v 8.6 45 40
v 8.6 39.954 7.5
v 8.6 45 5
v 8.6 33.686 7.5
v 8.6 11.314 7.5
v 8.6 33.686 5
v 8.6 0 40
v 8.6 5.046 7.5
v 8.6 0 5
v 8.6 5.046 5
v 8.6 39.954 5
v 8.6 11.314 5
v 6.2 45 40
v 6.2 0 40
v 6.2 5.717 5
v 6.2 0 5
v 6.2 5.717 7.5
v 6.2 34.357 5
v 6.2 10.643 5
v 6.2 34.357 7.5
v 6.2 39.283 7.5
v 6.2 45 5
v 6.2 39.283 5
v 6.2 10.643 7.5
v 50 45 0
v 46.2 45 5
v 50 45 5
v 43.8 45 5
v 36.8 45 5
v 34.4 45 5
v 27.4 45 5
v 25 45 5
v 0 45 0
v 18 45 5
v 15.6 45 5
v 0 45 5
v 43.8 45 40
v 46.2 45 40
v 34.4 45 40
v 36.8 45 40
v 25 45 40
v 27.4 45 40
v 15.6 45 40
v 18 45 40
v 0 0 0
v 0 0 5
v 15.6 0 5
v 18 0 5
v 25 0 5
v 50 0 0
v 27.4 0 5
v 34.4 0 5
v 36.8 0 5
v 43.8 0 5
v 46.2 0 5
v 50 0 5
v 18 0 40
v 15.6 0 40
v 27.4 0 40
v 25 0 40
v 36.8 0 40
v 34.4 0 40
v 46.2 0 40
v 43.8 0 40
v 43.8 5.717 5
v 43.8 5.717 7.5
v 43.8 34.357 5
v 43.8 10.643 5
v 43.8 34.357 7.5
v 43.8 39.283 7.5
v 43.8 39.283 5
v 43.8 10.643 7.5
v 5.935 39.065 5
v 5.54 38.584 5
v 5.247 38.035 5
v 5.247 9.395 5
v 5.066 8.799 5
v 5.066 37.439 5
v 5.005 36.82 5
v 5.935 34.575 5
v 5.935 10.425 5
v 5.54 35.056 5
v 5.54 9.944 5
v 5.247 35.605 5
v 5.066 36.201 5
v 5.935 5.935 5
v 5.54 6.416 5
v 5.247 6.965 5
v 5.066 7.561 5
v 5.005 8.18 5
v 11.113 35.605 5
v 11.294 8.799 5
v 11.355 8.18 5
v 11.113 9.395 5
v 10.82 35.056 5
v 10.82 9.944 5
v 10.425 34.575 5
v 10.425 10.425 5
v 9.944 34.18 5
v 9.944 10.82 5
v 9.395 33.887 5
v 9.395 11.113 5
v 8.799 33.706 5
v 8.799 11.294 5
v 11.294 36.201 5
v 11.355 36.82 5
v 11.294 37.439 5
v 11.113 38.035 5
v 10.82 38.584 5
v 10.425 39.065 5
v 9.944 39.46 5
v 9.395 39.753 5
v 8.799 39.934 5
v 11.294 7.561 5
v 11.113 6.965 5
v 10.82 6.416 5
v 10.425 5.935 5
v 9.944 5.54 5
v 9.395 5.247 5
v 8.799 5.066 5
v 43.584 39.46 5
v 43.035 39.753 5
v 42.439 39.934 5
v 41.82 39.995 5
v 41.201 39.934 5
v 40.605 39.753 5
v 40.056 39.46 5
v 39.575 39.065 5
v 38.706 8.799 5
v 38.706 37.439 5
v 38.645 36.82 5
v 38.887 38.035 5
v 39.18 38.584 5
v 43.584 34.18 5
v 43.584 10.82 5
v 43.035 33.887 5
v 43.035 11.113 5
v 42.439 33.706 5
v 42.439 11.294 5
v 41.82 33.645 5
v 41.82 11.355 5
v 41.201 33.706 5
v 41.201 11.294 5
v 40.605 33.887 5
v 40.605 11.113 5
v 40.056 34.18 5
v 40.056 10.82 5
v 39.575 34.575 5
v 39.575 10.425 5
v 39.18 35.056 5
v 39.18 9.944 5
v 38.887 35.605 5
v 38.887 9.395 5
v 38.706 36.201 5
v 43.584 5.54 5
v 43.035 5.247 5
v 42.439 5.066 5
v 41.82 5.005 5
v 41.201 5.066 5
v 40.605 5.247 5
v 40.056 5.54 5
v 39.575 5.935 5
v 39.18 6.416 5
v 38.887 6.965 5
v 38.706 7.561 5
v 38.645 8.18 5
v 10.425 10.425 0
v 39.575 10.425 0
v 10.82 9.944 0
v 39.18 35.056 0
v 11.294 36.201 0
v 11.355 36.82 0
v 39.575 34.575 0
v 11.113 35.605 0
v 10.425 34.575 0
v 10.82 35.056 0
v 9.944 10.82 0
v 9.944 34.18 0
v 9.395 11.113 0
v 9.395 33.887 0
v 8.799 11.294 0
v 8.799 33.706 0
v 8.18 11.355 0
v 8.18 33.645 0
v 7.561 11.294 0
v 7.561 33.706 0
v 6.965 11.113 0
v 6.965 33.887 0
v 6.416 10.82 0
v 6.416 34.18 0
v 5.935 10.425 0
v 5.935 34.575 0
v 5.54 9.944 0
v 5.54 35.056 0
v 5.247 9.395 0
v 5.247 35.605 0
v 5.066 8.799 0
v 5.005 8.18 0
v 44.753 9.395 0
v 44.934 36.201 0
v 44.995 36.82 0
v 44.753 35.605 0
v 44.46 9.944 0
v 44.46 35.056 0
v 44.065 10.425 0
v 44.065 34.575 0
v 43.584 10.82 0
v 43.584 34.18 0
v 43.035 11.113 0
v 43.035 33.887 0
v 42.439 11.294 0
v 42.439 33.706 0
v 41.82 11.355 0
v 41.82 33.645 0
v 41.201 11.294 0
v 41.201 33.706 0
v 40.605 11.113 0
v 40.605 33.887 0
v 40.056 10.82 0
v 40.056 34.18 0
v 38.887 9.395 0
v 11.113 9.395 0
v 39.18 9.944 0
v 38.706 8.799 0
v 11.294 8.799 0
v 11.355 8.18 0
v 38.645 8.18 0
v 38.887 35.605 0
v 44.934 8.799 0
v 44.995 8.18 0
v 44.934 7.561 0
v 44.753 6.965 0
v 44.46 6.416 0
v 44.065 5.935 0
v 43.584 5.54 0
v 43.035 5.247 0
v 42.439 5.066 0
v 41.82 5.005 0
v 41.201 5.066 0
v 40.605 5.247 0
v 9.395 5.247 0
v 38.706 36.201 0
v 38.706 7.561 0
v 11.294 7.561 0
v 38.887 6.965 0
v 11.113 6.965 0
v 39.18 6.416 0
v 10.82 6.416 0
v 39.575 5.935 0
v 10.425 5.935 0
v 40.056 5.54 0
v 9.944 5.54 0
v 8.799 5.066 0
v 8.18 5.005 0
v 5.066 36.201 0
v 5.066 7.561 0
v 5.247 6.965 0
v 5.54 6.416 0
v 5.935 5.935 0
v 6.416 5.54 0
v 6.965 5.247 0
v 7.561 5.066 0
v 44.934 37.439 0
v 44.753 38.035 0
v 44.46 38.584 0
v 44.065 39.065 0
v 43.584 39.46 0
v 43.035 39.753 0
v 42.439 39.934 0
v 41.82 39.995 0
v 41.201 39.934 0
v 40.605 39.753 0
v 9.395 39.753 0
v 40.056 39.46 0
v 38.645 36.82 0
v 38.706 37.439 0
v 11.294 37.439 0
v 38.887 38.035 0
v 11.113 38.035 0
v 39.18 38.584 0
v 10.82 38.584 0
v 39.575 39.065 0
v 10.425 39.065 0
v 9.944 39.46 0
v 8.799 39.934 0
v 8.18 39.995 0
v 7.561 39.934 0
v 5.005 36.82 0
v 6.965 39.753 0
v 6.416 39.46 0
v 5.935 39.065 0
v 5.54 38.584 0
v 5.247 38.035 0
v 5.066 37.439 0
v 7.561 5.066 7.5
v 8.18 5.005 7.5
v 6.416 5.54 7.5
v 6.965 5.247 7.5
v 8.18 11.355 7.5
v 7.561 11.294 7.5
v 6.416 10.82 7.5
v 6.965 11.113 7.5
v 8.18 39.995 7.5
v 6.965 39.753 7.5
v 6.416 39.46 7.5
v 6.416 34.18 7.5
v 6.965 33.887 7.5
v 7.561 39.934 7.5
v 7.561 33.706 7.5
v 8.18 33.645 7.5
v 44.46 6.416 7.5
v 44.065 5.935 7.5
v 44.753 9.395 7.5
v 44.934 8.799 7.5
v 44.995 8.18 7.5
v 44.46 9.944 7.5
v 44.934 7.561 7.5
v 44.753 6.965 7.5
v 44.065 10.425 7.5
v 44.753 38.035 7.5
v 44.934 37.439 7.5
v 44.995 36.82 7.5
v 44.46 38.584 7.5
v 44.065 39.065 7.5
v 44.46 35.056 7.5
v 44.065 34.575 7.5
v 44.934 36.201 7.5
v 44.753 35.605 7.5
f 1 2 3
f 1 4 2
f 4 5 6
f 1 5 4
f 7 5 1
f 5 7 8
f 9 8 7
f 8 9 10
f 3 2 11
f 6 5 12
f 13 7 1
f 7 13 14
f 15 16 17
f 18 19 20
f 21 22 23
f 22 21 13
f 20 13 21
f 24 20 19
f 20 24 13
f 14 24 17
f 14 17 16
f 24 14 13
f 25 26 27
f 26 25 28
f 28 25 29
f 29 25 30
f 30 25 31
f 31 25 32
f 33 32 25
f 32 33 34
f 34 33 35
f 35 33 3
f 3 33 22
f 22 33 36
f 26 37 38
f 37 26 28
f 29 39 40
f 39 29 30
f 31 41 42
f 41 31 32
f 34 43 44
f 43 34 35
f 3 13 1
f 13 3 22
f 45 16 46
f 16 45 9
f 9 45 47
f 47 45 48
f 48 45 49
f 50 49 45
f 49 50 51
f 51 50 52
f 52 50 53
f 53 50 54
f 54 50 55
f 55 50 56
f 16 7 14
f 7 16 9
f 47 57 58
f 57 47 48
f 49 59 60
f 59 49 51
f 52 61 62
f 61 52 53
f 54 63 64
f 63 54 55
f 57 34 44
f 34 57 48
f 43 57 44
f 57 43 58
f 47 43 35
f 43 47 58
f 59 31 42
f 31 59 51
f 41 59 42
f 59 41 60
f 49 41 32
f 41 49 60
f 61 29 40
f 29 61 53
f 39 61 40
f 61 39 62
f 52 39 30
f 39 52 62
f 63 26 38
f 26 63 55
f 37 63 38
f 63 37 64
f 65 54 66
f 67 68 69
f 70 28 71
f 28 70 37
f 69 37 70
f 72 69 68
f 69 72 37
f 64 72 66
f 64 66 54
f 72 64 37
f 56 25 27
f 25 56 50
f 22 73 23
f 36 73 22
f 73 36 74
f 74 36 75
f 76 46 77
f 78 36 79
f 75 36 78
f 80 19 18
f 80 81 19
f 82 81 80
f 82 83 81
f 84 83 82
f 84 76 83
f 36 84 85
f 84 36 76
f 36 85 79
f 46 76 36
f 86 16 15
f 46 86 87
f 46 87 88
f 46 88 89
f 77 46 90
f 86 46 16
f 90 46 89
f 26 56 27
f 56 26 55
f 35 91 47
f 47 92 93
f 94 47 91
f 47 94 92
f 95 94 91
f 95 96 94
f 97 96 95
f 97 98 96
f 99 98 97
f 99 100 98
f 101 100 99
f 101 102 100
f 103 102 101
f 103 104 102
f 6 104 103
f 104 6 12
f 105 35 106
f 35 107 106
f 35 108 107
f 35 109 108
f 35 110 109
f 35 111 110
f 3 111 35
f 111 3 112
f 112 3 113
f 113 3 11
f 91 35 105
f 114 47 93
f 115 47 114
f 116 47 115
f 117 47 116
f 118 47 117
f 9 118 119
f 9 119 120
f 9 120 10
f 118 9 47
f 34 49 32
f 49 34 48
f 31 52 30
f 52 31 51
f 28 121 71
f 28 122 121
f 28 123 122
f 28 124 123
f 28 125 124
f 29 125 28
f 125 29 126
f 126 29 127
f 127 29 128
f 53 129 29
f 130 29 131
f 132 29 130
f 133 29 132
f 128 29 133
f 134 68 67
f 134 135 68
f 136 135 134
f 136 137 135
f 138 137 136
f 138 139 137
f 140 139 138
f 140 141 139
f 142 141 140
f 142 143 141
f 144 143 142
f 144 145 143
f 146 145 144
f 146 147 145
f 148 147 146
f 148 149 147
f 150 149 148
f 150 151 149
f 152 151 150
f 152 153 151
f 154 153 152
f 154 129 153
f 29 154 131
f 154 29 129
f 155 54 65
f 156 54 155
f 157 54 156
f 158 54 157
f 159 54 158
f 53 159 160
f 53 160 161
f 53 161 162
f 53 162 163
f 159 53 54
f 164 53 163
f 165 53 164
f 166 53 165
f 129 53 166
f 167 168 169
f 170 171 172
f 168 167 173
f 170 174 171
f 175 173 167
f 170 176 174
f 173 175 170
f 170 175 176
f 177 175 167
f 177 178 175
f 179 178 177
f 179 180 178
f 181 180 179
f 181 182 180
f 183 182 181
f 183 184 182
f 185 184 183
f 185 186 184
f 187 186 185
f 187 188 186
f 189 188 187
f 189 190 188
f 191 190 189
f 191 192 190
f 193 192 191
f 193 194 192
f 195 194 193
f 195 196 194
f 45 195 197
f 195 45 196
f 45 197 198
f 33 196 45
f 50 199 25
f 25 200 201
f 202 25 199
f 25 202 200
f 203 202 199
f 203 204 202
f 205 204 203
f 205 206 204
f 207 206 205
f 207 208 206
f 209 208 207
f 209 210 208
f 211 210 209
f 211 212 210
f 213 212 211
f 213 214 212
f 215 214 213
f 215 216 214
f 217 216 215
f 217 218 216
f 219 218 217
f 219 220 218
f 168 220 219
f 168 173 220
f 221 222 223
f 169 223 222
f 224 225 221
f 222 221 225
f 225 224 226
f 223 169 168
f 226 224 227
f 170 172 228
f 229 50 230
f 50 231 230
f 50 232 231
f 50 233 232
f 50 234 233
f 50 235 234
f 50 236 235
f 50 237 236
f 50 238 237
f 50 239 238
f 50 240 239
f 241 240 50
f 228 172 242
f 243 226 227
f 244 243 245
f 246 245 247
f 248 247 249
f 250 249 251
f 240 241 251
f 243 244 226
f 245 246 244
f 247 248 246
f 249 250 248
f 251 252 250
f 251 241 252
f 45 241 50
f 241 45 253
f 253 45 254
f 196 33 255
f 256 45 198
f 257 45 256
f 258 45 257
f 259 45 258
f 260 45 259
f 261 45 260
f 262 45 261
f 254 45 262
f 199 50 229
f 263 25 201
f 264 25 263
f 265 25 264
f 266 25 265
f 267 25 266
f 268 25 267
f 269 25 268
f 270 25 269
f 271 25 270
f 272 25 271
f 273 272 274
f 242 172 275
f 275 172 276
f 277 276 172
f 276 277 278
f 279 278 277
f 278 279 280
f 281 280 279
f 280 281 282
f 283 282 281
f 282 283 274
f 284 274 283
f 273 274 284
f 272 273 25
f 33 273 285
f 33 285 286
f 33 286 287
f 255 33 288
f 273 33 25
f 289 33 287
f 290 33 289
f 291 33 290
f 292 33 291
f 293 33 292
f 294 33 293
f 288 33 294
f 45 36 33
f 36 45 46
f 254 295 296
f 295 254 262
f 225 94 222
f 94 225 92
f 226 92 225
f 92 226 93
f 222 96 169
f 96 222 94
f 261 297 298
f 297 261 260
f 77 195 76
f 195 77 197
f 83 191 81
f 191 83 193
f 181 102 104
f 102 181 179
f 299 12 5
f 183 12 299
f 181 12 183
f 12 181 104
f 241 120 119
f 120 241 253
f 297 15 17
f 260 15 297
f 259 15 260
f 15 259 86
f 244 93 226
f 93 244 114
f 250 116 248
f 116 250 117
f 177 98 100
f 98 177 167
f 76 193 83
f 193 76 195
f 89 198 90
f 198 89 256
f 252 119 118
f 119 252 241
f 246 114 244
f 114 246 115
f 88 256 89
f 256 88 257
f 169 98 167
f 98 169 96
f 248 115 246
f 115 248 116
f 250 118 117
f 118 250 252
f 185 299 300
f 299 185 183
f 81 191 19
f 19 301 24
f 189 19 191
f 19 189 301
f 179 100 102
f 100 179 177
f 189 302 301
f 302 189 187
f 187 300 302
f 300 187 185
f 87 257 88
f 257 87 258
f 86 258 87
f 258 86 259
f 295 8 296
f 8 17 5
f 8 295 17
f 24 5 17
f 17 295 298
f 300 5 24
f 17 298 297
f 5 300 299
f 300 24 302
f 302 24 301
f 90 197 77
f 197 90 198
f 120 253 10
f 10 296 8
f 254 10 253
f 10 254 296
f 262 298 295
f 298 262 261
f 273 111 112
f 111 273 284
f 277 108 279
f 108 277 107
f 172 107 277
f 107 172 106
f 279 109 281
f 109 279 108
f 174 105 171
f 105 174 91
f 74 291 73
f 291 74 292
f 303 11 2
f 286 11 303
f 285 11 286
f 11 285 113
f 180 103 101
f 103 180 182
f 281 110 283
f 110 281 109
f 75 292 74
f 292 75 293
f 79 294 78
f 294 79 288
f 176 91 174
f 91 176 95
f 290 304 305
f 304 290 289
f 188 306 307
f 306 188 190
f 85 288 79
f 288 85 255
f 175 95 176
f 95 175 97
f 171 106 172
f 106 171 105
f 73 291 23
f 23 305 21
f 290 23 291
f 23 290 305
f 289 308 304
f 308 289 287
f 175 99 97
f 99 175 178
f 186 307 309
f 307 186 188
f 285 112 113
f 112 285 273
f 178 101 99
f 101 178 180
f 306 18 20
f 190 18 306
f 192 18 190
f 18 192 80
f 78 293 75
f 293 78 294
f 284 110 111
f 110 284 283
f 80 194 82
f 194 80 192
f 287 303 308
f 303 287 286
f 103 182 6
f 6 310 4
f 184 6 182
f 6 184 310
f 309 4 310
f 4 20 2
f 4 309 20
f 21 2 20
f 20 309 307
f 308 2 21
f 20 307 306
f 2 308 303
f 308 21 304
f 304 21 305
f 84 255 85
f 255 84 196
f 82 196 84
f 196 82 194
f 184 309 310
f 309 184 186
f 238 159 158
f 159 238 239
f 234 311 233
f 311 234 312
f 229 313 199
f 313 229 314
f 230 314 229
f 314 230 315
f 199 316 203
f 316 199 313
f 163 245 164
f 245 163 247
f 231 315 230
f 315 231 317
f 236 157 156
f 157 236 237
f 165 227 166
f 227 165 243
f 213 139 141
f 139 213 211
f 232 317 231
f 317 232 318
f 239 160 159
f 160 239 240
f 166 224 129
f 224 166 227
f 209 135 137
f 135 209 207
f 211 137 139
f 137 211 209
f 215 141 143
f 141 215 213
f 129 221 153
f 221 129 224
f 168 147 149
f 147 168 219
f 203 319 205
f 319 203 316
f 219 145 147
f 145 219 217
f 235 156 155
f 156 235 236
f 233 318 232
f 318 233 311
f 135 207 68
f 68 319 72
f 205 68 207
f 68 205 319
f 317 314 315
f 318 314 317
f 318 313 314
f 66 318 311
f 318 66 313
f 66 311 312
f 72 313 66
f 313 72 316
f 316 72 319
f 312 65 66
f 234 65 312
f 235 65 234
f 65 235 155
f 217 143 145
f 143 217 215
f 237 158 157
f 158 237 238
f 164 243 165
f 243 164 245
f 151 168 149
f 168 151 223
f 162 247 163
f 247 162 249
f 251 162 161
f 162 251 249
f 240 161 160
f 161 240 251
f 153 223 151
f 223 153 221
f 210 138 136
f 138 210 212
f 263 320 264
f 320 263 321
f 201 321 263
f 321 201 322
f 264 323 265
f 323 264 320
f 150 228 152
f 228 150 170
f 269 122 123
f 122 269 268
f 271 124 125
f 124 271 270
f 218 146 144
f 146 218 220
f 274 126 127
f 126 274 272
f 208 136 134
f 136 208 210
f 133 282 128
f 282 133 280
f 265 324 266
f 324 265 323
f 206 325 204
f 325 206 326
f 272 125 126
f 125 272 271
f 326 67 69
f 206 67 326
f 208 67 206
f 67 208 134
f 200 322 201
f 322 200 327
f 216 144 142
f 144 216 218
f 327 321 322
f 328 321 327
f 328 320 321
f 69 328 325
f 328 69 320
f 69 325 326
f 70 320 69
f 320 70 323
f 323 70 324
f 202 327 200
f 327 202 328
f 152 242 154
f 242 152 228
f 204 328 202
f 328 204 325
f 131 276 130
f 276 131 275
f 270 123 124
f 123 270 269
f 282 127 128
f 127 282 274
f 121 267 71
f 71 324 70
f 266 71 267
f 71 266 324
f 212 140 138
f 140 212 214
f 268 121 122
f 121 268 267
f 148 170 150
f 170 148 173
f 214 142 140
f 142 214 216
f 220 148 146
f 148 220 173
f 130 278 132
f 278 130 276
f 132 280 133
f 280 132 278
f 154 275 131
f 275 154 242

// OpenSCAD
$fn = 32;

// ----------------------------------------------------------------------
// Finned heat sink: 50 x 45 mm base, 35 mm fins
// ----------------------------------------------------------------------

// --- parameters (mm) ---
base_w = 50;              // base width
base_d = 45;              // base depth
base_t = 5;               // base thickness
fin_h = 35;               // fin height above the base
holes_d = 6.35;           // fixing holes
hole_x = 16.82;           // hole offset in x
hole_y = 14.32;           // hole offset in y
fin_t = 2.4;              // fin thickness
fin_pitch = 9.4;          // fin pitch
fin_count = 5;            // number of fins
fin_x0 = 6.2;             // first fin offset

difference() {
  union() {
    cube([base_w, base_d, base_t]);
    for (i = [0 : fin_count - 1]) {
      translate([fin_x0 + i * fin_pitch, 0, base_t - 0.5]) cube([fin_t, base_d, fin_h + 0.5]);
    }
  }
  /* fixing holes through the base, 2.5 mm clear on both sides */
  for (hx = [-16.82, 16.82]) {
    for (hy = [-14.32, 14.32]) {
      translate([base_w / 2 + hx, base_d / 2 + hy, -2.5]) cylinder(h = base_t + 5, d = holes_d);
    }
  }
}
